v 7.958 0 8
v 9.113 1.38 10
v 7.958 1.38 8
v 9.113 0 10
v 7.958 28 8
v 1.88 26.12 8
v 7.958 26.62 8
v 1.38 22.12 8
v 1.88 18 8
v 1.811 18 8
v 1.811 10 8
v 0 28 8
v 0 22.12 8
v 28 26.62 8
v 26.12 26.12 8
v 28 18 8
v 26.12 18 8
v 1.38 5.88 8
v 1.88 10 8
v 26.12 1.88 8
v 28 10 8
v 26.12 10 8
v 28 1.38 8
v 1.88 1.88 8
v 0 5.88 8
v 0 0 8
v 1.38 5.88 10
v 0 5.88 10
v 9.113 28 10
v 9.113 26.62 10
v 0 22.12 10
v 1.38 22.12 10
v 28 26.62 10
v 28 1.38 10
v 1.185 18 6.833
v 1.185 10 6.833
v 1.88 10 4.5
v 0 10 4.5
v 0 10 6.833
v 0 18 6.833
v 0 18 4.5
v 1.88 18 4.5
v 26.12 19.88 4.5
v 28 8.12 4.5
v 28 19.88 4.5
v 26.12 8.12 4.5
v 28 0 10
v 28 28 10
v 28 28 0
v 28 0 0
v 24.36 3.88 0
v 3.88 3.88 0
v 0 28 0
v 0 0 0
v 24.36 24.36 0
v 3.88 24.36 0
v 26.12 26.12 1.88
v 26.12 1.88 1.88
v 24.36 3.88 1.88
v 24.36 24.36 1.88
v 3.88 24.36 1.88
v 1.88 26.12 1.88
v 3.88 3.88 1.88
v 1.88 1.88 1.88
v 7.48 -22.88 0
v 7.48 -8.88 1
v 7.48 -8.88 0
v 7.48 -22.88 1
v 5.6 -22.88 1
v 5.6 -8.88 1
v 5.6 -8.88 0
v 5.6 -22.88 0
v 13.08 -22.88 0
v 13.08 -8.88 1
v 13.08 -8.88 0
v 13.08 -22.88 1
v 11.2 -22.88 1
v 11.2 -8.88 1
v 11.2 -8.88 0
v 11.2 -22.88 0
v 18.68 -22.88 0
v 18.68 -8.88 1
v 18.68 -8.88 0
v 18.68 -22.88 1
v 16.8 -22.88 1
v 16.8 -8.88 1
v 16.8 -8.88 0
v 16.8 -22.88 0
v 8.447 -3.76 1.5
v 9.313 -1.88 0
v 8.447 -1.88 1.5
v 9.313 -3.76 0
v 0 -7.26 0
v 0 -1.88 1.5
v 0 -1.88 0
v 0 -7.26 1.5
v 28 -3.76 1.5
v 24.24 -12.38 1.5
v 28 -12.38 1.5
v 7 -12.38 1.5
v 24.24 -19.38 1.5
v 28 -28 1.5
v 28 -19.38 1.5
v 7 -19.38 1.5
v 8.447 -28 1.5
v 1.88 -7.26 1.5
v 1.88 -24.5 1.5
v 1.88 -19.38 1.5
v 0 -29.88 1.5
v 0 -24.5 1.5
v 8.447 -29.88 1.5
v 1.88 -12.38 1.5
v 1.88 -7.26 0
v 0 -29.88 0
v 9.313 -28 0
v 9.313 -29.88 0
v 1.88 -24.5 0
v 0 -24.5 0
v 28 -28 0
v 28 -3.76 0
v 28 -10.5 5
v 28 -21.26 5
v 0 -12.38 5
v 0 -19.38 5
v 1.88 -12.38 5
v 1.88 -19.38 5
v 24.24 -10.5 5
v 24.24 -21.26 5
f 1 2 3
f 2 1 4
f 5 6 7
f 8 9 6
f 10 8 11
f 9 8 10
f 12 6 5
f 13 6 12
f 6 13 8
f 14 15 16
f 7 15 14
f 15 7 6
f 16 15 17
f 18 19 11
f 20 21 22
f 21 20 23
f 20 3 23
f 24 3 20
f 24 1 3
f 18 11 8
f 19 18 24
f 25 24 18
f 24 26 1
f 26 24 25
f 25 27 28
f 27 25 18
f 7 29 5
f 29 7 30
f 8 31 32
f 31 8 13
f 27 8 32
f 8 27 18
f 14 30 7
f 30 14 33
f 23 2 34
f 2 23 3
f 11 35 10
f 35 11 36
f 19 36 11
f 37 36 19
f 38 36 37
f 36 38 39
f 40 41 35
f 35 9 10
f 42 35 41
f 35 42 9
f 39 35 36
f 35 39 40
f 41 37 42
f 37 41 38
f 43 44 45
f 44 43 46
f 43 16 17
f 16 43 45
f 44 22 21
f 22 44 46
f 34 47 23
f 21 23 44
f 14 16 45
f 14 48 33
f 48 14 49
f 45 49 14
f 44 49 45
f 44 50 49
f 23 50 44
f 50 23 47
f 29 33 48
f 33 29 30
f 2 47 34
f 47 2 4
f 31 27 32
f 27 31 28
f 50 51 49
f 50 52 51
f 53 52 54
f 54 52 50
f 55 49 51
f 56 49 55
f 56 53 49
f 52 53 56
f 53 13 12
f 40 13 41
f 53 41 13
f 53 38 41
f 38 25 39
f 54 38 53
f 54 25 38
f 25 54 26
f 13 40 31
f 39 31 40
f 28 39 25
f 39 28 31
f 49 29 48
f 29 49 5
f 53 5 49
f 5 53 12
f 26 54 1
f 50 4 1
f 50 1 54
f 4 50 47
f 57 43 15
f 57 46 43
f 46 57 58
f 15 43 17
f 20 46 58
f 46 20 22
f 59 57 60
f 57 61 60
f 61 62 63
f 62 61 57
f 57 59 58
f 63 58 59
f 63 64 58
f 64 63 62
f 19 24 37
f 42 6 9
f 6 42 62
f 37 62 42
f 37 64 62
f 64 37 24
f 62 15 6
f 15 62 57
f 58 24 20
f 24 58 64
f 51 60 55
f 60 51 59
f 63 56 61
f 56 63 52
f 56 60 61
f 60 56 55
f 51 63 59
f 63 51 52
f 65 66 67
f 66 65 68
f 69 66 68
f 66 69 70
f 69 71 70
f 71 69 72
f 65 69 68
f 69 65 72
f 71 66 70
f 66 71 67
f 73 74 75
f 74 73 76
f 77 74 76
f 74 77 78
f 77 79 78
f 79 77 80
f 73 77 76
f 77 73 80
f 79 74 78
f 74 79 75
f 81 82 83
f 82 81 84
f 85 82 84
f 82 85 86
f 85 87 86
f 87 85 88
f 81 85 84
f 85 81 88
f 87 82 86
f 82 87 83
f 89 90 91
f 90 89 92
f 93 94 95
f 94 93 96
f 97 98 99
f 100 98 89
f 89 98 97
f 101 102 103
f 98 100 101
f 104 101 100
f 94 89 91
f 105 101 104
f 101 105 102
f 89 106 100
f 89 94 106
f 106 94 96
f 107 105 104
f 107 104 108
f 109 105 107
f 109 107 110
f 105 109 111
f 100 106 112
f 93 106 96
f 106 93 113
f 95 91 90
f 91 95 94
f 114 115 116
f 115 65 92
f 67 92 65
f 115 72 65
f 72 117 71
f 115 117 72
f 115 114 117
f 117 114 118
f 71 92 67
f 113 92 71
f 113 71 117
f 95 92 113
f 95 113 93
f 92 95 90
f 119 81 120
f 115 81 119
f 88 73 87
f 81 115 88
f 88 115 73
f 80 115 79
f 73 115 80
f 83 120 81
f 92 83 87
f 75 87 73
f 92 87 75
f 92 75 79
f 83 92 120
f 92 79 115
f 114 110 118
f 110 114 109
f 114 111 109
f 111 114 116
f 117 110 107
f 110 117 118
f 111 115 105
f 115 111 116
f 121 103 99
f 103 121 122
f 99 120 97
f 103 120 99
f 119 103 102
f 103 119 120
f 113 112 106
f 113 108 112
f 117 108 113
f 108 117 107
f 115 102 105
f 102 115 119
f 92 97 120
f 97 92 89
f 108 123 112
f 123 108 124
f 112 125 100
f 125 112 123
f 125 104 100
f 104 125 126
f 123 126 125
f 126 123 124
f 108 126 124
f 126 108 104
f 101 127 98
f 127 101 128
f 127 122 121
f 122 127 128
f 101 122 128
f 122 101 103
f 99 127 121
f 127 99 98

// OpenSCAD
l = 28;    // outer length of box (mm)
t = 1.5;   // thickness of cover plate (mm)
d = 1.88;  // thickness of side walls (mm)
h = 10;    // outer height of box (mm)
k = 7;     // snap dimension (mm)
e = 0.5;   // spacibng between parts (mm)
v = 0.2;   // snap inversion (mm)
a = 60;    // snap angle (deg)

module part_top(s)
{
	vv = s > 0 ? v : 0;
	module side_profile() {
		len = s+d+k-vv;
		len_delta = cos(a)/sin(a) * (t+2*s);
		rotate([-90, 0, 0]) linear_extrude(height = d+k/2+2*s) translate([0,-t-2*s])
			polygon([[0, 0], [len+len_delta/2,0], [len-len_delta/2,t+2*s], [0,t+2*s]]);
	}
	translate([0, 0, h-t-s]) difference() {
		union() {
			translate([d-s, d-s, 0])
					cube([ l-d+2*s, l-2*d+2*s, t+2*s ]);
			for (pos = [-s, l-d-k/2-s])
				translate([-s, pos, 0]) side_profile();
			translate([vv, l/2+k/2+s, s])
				rotate([0, 90, -90]) linear_extrude(height = k+2*s)
					polygon([ [0,d], [k/2,0], [k/2,d], [0,k] ]);
			if (s > 0)
				translate([ -s, l/2-k/2-s, -k/2 ]) cube([ d+2*s, k+2*s, k/3 ]);
			translate([l-2*d-s, l/2+k/2, 0])
				rotate([-90, 0, -90]) linear_extrude(height = 2*d+2*s)
					polygon([ [-s,0], [ k/2, -t/2 ], [k+s,0], [k+d+s,k/2], [-d-s,k/2] ]);
		}
		for (i = [1:3])
			translate([ i*l/5, l/4, t/3 ])
				cube([ d, l/2, t ]);
	}
}

module part_bottom()
{
	difference() {
		cube([ l, l, h ]);
		translate([d, d, d]) cube([ l-2*d, l-2*d, h ]);
		translate([d+2, d+2, -d]) cube([ l-4*d, l-4*d, d*3 ]);
		part_top(e);
	}
}

module panel() {
	color([ 0.4, 0.8, 0.4 ]) part_bottom();
	rotate([ 180, 0, 0 ]) translate([0, d, -h])
		color([ 0, 0.8, 0.8 ]) part_top(0);
}

module show() {
	color([ 0.4, 0.8, 0.4 ]) part_bottom();
	color([ 0, 0.8, 0.8 ]) part_top(0);
}

module debug() {
	module cuthalf(k) {
		difference() {
			child(0);
			translate([-1, l/2+k, -1]) cube([ l+2, l/2+1, h+2 ]);
		}
	}
	color([ 0.4, 0.8, 0.4 ]) cuthalf(1) part_bottom();
	color([ 0, 0.8, 0.8 ]) cuthalf(0) part_top(0);
}

panel();
